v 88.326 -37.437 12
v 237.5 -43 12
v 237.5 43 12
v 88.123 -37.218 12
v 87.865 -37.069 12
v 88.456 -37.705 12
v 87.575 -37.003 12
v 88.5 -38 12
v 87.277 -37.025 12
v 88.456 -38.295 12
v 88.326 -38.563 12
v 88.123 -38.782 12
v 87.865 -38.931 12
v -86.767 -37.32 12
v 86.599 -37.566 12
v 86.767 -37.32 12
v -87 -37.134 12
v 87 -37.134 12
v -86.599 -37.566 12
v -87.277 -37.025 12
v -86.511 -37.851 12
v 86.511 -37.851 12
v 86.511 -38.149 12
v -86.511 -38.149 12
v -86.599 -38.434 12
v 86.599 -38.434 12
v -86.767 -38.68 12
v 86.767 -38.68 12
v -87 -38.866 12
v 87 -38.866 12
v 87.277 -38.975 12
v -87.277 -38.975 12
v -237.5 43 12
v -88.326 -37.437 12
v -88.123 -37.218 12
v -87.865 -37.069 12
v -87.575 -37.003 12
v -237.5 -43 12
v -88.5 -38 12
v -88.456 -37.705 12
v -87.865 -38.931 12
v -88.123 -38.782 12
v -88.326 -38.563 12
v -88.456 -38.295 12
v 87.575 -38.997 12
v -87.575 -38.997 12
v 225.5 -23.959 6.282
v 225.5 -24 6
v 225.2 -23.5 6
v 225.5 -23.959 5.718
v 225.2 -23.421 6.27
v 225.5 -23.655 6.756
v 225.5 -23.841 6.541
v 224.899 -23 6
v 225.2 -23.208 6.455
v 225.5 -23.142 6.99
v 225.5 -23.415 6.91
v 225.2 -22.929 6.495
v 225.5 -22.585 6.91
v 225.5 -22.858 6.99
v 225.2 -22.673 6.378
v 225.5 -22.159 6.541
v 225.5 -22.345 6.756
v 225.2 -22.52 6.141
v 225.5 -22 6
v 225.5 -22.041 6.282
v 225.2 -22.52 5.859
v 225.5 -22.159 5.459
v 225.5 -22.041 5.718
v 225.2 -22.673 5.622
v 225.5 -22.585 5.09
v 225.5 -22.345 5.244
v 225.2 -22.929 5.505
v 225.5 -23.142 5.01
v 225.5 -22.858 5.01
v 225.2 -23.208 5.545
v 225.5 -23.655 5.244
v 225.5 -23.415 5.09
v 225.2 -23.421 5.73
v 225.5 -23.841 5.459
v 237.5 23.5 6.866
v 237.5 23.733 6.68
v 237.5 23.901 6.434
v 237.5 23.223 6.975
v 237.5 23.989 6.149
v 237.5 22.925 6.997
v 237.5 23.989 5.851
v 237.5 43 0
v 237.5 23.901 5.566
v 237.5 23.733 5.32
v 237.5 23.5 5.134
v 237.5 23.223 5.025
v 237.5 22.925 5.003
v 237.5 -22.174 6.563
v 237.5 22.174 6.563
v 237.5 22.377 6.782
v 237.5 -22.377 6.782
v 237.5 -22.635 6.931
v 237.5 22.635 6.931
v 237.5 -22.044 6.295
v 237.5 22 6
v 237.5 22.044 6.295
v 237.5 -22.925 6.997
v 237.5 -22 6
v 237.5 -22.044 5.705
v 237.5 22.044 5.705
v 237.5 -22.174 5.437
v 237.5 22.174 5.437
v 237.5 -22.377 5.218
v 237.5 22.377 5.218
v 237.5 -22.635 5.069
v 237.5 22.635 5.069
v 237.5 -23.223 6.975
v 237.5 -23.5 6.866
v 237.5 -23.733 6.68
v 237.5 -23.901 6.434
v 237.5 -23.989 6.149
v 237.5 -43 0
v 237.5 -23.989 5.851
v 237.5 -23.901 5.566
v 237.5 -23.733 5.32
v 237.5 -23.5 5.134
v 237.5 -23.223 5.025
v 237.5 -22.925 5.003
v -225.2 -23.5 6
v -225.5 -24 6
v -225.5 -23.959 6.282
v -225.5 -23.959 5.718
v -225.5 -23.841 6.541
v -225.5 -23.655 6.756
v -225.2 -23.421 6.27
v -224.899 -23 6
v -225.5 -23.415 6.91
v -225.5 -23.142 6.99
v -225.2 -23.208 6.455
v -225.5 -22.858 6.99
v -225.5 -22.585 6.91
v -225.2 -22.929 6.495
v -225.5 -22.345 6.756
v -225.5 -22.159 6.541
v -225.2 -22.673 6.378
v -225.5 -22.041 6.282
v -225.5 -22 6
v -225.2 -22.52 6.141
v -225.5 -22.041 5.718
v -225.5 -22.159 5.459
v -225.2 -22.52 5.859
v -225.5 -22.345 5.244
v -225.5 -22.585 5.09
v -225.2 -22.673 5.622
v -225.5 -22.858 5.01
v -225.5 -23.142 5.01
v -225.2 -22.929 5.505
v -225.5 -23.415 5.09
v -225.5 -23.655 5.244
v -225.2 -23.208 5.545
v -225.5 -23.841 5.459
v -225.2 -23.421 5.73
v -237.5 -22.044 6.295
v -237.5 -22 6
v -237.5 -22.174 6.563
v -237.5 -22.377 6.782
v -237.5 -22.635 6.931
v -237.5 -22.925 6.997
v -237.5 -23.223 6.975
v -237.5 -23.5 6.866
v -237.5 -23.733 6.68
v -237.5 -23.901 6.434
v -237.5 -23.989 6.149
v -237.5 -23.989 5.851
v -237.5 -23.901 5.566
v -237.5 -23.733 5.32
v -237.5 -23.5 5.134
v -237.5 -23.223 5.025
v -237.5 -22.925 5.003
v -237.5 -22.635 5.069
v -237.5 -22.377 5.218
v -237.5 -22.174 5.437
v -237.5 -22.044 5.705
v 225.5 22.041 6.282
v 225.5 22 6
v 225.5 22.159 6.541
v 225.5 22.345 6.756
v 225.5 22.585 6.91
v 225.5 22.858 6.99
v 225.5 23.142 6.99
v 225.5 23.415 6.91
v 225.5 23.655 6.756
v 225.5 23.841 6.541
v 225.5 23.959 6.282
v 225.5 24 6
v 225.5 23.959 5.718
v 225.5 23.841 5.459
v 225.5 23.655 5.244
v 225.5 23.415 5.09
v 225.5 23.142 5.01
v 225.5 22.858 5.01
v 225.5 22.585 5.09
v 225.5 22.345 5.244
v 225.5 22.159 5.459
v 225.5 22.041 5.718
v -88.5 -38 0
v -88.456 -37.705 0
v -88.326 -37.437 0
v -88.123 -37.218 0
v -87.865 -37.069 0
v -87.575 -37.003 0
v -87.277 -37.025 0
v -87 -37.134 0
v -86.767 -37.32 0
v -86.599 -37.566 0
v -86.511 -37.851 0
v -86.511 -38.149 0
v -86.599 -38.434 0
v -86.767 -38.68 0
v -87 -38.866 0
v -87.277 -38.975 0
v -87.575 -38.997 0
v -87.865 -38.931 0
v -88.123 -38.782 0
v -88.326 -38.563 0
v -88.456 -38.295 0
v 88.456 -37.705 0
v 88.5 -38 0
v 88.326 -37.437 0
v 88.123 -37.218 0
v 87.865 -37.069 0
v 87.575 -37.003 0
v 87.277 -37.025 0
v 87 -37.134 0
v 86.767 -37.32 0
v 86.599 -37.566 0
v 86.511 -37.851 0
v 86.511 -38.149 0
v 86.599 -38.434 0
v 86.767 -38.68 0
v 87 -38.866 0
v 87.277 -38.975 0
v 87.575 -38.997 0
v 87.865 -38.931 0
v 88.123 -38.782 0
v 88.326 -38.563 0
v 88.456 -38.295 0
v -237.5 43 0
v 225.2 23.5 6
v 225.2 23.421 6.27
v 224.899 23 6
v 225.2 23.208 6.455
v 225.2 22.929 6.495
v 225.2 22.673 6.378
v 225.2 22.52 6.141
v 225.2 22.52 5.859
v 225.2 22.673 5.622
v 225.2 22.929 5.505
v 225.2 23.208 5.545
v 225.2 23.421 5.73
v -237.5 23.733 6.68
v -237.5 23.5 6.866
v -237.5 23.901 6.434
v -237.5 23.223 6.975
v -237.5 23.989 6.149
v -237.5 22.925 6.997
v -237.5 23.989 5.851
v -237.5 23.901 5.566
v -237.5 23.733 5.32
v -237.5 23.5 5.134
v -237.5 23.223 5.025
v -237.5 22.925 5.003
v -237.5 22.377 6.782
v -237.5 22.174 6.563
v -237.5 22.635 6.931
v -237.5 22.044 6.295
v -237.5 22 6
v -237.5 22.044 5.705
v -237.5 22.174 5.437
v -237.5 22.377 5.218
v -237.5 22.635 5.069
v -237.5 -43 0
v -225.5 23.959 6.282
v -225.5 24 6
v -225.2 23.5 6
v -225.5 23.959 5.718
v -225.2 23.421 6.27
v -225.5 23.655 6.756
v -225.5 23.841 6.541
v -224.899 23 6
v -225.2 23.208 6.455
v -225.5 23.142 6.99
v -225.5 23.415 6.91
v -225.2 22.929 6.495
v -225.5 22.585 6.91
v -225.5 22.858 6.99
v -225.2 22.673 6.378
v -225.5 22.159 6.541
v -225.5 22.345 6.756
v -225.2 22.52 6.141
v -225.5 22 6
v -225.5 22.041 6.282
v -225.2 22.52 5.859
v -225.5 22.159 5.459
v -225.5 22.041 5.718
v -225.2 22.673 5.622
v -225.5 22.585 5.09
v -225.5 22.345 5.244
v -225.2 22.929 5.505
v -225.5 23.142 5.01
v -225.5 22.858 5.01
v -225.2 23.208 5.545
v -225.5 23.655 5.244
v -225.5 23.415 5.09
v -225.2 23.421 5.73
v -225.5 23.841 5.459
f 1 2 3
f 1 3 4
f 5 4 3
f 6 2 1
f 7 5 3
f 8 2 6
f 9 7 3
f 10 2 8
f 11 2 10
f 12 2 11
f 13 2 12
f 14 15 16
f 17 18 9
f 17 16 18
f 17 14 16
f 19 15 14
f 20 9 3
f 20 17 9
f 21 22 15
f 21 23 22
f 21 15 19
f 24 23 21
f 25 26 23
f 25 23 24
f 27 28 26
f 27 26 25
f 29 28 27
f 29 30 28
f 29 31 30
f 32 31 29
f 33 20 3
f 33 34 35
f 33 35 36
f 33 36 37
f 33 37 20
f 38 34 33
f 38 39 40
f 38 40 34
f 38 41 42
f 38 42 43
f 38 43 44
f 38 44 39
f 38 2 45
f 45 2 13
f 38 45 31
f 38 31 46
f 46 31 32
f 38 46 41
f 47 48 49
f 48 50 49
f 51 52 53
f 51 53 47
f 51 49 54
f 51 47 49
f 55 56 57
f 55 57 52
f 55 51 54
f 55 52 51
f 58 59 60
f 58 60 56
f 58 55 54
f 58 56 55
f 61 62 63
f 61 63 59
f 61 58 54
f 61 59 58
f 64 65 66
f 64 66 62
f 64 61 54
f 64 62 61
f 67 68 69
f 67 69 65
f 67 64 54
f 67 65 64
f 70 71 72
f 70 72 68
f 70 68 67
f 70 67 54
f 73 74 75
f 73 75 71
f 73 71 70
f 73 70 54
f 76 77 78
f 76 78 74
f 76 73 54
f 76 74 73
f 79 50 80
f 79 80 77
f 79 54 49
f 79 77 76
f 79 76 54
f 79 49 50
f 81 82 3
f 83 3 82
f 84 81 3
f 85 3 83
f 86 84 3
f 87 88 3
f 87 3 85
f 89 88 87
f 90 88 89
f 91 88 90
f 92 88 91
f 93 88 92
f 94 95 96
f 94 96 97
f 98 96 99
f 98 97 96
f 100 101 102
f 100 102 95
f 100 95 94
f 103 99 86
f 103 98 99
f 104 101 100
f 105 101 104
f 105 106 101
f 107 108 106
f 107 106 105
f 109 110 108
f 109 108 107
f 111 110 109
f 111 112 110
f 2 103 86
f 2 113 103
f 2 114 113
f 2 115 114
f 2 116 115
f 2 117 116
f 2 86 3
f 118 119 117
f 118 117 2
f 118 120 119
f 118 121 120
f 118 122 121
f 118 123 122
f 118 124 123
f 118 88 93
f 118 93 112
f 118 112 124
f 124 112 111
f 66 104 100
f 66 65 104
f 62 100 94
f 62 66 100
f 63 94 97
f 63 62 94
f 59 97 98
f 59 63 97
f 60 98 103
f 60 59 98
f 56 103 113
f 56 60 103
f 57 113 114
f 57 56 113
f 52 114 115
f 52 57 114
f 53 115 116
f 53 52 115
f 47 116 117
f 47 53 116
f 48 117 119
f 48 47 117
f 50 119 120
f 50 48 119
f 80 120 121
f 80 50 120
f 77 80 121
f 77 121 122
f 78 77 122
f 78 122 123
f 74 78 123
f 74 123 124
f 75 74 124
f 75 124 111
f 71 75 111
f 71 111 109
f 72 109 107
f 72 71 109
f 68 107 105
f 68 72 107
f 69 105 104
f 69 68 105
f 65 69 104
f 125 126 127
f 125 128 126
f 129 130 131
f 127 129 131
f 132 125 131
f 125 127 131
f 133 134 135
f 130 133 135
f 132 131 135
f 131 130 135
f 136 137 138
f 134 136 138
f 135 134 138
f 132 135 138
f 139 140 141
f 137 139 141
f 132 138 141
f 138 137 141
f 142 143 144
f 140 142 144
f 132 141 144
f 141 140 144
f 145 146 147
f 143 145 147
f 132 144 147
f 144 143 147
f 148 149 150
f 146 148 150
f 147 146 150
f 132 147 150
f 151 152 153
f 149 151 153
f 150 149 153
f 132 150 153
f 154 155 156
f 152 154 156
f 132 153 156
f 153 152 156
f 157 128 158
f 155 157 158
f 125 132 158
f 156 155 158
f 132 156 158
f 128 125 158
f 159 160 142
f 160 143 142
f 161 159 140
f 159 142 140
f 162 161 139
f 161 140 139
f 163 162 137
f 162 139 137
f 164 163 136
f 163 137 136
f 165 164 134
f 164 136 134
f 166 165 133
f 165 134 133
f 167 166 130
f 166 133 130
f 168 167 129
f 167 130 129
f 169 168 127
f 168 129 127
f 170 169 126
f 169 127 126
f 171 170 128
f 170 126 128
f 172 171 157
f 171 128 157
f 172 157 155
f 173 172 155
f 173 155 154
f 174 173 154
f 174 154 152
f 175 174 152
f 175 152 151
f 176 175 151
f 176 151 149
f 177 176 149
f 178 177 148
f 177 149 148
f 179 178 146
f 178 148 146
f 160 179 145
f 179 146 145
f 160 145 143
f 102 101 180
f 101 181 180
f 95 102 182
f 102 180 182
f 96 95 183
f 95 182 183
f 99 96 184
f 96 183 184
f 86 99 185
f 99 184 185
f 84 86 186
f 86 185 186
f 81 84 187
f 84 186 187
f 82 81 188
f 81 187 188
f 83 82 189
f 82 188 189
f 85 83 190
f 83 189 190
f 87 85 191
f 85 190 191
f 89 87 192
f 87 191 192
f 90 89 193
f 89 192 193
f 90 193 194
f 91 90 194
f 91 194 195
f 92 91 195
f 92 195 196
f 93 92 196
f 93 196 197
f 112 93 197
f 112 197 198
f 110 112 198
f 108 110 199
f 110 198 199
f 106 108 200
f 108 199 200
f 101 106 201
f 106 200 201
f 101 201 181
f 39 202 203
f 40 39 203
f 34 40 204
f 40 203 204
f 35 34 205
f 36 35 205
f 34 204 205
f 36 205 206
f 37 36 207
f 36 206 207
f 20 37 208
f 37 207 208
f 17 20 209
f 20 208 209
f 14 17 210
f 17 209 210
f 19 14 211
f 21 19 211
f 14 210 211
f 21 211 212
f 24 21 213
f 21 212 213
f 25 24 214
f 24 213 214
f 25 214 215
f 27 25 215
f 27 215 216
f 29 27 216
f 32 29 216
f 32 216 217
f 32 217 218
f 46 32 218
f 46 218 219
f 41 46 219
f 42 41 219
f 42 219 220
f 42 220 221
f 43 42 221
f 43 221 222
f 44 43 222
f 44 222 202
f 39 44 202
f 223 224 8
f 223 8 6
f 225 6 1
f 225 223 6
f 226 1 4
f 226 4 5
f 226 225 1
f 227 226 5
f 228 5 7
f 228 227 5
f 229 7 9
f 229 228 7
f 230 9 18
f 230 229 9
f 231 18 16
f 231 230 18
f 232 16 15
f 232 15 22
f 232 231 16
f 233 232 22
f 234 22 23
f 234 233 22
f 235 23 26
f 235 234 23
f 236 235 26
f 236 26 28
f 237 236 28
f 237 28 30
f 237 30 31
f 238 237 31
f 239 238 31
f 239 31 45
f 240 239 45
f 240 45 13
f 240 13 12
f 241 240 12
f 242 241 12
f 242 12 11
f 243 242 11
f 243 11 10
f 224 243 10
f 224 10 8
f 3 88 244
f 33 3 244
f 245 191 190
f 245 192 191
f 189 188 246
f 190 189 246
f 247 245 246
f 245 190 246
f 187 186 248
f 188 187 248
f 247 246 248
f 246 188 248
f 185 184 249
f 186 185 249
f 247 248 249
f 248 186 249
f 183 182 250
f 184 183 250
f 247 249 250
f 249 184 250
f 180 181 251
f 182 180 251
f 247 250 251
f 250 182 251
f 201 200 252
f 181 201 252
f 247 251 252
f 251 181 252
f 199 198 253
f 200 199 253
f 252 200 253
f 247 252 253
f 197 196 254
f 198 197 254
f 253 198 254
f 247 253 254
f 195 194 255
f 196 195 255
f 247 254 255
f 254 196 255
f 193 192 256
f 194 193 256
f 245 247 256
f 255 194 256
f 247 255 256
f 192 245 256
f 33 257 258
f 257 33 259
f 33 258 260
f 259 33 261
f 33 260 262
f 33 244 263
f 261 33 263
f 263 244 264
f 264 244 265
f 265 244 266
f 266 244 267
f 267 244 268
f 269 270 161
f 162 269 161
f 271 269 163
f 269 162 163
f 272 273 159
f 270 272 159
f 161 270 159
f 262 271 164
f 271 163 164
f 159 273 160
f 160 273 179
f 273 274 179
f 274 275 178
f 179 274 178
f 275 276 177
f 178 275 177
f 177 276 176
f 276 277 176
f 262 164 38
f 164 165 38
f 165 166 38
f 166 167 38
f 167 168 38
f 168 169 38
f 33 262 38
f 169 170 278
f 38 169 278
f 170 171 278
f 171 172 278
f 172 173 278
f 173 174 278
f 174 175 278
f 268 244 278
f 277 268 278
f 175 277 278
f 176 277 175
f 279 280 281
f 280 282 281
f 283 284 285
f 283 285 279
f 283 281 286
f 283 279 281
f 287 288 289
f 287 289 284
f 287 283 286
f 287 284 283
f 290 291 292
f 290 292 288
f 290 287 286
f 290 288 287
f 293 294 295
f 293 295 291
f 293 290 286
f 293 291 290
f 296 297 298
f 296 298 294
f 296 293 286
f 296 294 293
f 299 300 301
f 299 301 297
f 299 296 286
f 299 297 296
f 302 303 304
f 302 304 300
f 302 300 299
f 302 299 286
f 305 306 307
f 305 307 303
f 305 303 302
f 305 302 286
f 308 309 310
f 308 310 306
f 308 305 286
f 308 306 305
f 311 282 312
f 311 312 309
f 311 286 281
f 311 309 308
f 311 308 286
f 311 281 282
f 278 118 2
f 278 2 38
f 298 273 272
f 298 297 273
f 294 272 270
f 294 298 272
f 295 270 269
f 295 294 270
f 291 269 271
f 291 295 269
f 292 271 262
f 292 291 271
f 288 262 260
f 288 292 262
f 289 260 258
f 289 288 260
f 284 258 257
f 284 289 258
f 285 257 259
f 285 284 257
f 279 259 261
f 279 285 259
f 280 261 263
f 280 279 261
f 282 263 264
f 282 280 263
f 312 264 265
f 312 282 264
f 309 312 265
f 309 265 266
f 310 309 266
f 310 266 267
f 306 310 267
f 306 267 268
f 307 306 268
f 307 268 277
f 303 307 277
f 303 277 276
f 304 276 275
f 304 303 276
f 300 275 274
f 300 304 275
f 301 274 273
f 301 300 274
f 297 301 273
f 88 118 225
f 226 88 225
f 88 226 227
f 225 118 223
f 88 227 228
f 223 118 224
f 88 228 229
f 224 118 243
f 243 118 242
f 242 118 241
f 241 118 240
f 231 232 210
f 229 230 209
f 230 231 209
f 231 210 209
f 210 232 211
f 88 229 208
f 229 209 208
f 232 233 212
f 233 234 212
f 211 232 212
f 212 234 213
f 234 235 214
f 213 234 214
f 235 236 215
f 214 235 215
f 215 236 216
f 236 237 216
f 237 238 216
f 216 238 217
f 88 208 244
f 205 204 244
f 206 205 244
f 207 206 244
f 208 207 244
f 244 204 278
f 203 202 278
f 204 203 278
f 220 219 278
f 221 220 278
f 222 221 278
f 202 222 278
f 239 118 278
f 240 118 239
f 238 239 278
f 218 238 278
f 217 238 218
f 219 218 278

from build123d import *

# Parameters (mm, degrees)
F0_W     = 237.5
F0_H     = 43
F1_DEPTH = 12
F3_D     = 2
F3_DEPTH = 12
F3_TIP   = 0.600860619
F6_D     = 2


with BuildPart() as f1:
    # F0 (on Top) → F1 (new body)
    with BuildSketch(Plane.XY):
        with Locations((-118.75, -21.5)):
            Rectangle(F0_W, F0_H)
    extrude(amount=F1_DEPTH)

    # F3
    with Locations(Plane(origin=(-237.5, 0, 0), x_dir=(0, -1, 0), z_dir=(-1, 0, 0))):
        with Locations((23, 6)):
            Hole(F3_D / 2, depth=F3_DEPTH)
            with Locations((0, 0, -(F3_DEPTH + F3_TIP / 2))):  # 118° drill point
                Cone(0, F3_D / 2, F3_TIP, mode=Mode.SUBTRACT)

    # F4: F1 across plane


with BuildPart() as f1_1:
    add(f1.part)
    add(f1.part.mirror(Plane.XZ))

    # F6 (through all)
    with Locations(Plane.XY.offset(12)):
        with Locations((-87.5, -38)):
            Hole(F6_D / 2)

    # F7: F1 across plane


with BuildPart() as f1_2:
    add(f1_1.part)
    add(f1_1.part.mirror(Plane.YZ))


solid = f1_2.part
